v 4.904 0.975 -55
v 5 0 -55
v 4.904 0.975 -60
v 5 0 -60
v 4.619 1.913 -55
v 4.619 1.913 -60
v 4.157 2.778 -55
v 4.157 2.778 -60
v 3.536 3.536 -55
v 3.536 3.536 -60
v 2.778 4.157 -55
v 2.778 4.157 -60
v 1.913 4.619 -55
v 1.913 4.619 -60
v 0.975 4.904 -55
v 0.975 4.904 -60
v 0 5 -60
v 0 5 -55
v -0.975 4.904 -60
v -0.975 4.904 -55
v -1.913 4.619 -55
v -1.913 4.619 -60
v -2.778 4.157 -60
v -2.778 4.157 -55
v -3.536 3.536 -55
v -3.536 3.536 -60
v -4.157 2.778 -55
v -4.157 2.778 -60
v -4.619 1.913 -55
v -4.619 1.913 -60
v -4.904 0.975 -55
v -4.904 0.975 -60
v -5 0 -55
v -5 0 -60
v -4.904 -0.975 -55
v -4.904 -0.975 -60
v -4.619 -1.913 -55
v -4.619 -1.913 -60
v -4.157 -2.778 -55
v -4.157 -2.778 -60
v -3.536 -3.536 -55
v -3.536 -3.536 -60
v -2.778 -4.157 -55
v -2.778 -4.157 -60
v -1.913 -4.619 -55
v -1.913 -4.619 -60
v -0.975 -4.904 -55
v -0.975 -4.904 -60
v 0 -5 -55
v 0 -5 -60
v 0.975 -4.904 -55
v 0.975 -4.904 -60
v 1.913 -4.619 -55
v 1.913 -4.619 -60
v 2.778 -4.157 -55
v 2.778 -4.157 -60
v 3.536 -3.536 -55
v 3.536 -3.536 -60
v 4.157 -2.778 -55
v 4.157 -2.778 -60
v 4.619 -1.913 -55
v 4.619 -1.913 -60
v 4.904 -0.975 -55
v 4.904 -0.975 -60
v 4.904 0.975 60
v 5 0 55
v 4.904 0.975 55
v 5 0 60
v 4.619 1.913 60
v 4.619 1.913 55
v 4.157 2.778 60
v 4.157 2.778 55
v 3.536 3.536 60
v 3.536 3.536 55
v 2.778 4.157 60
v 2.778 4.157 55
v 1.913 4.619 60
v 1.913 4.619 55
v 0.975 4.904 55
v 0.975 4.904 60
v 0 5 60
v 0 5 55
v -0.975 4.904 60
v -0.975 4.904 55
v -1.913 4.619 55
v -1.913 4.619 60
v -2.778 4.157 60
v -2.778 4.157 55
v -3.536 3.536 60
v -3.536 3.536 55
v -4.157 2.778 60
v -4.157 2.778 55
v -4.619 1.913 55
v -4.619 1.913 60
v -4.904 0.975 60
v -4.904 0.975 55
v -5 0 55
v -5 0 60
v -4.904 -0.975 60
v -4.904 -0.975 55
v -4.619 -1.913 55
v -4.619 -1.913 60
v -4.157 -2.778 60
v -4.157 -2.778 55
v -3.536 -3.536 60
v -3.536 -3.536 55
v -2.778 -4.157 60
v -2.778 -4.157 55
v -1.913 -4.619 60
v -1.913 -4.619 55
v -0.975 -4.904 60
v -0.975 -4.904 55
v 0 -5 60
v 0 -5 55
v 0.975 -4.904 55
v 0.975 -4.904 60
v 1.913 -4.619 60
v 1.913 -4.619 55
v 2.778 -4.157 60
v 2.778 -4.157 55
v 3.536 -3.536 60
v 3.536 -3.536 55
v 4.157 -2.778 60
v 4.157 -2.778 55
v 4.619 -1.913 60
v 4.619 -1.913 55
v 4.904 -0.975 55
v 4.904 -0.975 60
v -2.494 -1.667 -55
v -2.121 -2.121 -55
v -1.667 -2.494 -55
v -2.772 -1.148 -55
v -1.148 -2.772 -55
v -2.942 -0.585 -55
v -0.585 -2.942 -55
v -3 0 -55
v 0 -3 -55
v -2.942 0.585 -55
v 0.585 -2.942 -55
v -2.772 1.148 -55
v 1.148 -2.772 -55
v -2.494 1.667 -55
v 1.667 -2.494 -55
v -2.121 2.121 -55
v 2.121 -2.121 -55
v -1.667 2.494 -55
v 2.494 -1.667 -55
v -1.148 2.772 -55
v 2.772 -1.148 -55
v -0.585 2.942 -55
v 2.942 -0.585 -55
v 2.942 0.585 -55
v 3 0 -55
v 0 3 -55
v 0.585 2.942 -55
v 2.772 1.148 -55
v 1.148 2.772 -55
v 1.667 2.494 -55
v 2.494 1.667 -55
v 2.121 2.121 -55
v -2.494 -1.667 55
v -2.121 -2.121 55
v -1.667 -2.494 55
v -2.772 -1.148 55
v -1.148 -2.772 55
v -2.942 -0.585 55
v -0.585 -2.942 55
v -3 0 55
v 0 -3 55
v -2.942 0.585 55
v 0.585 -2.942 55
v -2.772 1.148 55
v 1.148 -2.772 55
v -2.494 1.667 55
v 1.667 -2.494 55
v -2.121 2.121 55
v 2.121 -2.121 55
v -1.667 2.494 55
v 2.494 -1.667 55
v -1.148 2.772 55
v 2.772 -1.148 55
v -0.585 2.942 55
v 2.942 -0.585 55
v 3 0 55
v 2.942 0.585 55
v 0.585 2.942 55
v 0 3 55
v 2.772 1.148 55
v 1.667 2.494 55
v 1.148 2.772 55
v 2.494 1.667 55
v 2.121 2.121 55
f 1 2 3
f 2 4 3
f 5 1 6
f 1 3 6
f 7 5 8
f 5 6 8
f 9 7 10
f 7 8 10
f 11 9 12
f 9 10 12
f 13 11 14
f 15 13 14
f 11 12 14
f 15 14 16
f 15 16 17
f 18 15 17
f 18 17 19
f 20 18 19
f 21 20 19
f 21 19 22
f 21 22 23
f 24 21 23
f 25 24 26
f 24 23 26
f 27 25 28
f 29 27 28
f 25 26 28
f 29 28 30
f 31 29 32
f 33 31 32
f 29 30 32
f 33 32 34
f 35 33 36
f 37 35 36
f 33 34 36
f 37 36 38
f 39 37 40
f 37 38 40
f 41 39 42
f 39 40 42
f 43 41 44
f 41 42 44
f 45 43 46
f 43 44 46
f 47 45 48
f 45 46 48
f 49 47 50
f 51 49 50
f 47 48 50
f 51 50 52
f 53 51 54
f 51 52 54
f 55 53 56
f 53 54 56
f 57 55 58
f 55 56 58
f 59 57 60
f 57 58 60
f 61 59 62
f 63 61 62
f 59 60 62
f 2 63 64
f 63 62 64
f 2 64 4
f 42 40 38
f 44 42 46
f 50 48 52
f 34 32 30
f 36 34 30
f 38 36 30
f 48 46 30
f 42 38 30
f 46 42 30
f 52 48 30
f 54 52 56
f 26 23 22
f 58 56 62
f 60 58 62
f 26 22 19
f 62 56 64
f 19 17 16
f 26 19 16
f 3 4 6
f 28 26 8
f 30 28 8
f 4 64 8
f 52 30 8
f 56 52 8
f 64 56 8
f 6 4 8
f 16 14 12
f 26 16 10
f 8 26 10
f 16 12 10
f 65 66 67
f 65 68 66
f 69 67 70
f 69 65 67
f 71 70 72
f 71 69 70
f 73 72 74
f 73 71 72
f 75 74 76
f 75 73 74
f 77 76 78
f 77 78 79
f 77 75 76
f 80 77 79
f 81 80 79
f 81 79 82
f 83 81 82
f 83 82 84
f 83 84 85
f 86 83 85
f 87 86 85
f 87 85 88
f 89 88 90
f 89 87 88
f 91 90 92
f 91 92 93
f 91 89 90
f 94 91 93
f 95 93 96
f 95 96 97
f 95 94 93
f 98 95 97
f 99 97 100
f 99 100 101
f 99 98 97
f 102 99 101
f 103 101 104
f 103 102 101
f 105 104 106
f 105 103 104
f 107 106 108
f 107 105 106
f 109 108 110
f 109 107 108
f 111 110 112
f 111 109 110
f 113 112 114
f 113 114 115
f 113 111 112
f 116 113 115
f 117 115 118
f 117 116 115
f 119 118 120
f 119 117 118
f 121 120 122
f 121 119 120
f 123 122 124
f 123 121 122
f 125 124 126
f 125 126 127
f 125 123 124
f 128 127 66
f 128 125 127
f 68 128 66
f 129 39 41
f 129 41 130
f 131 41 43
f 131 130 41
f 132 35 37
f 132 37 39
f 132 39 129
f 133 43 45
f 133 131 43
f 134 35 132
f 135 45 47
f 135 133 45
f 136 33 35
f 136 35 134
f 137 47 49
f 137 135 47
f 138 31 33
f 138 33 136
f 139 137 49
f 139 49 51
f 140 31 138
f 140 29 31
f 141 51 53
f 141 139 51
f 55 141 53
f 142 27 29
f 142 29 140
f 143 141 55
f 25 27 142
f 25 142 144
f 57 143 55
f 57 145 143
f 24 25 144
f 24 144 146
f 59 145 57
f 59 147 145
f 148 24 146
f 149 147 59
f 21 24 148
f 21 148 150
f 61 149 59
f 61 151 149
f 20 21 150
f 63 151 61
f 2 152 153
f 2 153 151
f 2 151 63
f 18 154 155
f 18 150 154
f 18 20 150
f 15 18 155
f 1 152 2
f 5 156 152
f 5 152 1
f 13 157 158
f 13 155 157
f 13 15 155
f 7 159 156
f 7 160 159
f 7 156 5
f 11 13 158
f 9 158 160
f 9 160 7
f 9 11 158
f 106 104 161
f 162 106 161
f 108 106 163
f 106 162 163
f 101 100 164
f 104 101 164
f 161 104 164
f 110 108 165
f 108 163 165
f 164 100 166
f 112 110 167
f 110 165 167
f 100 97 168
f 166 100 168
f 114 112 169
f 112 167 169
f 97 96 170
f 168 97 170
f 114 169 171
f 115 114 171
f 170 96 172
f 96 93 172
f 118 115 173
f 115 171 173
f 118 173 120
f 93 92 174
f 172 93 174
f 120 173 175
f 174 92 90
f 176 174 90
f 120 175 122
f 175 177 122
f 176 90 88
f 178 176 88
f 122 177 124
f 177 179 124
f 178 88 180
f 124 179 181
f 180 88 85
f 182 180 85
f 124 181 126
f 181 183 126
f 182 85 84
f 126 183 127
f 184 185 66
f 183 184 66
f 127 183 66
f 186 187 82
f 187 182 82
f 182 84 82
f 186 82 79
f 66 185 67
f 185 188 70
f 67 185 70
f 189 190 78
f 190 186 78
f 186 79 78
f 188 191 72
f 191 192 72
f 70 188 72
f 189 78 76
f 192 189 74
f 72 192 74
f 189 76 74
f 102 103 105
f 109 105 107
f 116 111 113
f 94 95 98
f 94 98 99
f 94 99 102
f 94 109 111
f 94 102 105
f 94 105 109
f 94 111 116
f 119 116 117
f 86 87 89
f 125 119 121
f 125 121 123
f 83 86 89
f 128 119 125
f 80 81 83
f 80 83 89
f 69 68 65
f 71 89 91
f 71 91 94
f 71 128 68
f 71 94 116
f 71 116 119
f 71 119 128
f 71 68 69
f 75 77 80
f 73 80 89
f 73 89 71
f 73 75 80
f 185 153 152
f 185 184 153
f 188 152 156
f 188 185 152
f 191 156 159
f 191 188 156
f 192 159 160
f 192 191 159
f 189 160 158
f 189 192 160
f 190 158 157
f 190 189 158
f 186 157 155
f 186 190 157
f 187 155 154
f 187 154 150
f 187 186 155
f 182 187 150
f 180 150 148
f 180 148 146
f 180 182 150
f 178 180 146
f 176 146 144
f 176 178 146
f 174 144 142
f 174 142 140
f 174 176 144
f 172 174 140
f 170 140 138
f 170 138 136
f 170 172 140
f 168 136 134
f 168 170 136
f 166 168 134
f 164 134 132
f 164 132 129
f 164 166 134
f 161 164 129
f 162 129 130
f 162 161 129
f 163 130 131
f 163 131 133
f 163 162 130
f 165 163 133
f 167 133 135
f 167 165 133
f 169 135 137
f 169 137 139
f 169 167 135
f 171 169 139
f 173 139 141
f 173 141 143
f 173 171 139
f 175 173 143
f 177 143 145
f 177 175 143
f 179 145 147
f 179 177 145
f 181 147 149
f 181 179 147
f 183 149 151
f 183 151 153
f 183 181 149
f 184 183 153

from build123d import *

# Parameters (mm, degrees)
SKETCH1_R           = 3
BOSS_EXTRUDE1_DEPTH = 57.5
SKETCH2_R           = 5
BOSS_EXTRUDE2_DEPTH = 2.5


with BuildPart() as part:
    # Sketch1 → Boss-Extrude1 (new, symmetric)
    with BuildSketch(Plane.XY):
        Circle(SKETCH1_R)
    extrude(amount=BOSS_EXTRUDE1_DEPTH, both=True)

    # Sketch2 → Boss-Extrude2 (add, symmetric)
    with BuildSketch(Plane.XY.offset(57.5)):
        Circle(SKETCH2_R)
    boss_extrude2 = extrude(amount=BOSS_EXTRUDE2_DEPTH, both=True)

    # Mirror1: Boss-Extrude2 across plane
    add(boss_extrude2.mirror(Plane.XY))


solid = part.part
